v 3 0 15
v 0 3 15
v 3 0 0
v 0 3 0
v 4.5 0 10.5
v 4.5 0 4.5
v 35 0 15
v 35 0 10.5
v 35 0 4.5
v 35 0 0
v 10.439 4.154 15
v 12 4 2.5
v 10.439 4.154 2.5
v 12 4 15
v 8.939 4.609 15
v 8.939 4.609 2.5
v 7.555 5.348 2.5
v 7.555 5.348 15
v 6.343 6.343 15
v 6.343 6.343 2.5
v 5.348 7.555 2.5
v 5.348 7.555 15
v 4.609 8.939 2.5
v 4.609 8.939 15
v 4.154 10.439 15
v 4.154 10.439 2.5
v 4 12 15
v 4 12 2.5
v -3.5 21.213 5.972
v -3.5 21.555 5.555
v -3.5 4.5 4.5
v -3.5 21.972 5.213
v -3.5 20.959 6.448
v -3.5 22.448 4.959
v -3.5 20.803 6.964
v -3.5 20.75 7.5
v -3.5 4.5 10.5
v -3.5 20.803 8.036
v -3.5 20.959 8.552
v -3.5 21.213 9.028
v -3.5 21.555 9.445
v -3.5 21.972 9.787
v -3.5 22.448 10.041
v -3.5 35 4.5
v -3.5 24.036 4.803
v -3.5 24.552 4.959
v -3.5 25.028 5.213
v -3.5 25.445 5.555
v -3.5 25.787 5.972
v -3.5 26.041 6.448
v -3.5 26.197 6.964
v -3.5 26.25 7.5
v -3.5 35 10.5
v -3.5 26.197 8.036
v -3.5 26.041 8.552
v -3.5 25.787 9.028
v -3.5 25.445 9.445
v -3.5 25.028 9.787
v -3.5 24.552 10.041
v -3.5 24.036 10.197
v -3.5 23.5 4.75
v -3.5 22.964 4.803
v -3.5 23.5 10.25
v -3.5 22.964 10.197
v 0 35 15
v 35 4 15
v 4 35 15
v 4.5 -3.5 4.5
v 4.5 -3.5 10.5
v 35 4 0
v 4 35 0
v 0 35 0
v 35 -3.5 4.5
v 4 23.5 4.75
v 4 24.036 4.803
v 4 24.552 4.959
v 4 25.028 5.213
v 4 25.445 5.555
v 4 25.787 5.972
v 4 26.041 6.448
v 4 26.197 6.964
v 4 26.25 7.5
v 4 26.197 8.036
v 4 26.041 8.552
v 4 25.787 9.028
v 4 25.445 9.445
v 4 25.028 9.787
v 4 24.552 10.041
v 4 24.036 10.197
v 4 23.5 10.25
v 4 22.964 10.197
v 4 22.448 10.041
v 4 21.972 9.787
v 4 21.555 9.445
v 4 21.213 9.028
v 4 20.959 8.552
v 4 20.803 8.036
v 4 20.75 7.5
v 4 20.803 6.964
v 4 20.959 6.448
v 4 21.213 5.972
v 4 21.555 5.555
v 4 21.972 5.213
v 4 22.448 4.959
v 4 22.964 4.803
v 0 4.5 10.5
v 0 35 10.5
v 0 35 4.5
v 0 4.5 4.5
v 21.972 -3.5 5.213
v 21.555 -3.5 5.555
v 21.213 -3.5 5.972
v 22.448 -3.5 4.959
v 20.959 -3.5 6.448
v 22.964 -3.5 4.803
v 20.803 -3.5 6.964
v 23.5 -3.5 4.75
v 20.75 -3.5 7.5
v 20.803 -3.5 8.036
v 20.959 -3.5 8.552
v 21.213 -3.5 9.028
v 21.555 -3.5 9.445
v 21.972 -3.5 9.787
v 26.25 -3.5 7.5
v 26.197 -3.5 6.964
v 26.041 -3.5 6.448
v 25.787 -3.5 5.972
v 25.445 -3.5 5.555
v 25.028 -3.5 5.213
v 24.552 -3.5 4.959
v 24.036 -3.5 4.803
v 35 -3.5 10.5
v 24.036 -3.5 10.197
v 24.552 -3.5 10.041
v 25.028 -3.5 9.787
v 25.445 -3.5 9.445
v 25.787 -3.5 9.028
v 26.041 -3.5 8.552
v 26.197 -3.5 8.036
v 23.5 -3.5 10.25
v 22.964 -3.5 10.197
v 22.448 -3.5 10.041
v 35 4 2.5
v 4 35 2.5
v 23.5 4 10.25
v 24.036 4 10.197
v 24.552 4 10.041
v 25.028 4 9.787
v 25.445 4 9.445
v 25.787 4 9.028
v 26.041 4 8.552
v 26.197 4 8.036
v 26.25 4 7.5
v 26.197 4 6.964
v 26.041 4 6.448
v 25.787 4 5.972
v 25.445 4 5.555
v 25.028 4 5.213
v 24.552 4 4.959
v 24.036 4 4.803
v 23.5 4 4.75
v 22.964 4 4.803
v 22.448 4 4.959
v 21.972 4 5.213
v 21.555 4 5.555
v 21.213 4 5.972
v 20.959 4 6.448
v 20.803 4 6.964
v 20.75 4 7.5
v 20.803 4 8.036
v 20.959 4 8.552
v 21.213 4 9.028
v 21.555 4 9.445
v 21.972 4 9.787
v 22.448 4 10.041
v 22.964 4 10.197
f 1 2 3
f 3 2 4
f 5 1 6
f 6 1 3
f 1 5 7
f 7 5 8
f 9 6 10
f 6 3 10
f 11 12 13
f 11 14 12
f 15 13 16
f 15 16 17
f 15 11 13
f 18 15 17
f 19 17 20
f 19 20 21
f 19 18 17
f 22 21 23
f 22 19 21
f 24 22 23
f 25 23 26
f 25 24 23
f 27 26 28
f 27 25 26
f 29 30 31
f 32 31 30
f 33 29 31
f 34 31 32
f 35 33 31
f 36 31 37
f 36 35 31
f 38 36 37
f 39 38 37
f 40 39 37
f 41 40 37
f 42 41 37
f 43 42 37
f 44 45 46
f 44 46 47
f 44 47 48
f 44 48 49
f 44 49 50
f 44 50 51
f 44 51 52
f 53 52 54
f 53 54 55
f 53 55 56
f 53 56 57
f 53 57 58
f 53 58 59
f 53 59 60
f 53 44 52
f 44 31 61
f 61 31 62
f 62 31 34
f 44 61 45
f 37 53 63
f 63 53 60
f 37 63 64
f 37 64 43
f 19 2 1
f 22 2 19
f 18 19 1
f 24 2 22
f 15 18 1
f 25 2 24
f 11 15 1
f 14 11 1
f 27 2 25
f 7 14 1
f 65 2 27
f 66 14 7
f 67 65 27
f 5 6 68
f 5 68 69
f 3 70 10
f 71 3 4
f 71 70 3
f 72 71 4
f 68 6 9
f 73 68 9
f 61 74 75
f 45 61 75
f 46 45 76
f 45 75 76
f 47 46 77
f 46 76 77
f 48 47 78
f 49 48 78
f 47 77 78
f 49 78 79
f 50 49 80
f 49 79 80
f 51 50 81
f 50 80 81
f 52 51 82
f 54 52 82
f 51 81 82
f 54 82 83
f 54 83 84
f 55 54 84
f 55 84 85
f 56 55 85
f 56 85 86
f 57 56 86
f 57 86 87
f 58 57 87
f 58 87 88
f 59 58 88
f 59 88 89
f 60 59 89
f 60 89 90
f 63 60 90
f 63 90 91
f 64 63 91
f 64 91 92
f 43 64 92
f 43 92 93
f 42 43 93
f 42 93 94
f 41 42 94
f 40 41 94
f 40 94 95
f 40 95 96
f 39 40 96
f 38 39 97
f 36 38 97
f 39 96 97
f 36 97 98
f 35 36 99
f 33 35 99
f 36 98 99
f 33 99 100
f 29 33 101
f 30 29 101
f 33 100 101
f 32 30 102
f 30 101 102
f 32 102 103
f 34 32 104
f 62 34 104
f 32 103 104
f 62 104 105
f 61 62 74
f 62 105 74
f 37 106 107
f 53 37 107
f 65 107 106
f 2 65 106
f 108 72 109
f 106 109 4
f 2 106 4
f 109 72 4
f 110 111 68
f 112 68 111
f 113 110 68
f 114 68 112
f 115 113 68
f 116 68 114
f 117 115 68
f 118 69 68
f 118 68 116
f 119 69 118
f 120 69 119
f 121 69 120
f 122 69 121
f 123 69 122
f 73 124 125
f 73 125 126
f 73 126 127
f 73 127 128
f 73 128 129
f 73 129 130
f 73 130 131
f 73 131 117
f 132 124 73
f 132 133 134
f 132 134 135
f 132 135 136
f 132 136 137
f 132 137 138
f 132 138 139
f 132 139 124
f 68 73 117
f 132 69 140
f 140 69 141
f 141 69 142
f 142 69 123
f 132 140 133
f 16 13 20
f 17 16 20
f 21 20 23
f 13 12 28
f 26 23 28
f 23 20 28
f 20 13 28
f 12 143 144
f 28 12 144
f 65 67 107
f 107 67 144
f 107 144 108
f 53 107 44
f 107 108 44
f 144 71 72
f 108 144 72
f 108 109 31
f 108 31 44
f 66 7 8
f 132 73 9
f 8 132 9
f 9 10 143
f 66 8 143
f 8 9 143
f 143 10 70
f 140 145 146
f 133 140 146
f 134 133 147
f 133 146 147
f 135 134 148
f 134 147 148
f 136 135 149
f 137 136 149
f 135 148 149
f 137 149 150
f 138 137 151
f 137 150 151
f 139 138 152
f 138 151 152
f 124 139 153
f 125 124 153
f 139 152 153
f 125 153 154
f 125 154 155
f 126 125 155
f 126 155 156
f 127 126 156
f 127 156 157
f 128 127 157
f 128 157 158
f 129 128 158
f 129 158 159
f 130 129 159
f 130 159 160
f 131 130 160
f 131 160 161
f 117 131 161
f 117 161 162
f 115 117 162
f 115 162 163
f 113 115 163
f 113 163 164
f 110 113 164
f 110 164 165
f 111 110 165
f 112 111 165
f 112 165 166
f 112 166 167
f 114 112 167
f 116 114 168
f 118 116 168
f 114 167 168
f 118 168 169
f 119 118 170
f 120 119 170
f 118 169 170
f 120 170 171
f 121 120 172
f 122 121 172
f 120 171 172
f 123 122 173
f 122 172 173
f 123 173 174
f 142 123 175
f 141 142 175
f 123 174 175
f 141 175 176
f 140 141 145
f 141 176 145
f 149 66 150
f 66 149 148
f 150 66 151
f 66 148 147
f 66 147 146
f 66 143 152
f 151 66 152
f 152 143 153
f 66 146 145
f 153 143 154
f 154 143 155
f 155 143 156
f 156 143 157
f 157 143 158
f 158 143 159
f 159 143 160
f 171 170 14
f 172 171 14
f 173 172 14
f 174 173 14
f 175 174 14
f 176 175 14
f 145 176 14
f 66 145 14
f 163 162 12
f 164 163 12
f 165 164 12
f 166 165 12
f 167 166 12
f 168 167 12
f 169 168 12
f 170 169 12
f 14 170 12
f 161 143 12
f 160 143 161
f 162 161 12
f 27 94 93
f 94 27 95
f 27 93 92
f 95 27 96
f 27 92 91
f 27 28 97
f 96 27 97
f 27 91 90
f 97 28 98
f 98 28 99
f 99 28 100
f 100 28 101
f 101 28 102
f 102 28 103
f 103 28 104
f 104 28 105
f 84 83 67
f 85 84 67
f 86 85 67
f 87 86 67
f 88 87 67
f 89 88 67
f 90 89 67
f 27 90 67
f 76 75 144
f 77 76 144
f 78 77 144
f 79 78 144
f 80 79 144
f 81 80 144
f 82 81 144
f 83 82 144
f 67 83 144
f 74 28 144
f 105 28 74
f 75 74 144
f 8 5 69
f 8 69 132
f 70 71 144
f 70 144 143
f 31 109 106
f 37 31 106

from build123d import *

# Parameters (mm, degrees)
BOSS_EXTRUDE1_DEPTH = 2.5
BOSS_EXTRUDE2_DEPTH = 12.5
SKETCH5_W           = 30.5
SKETCH5_H           = 6
BOSS_EXTRUDE3_DEPTH = 3.5
SKETCH6_W           = 6
SKETCH6_H           = 30.5
BOSS_EXTRUDE4_DEPTH = 3.5
CUT_EXTRUDE1_REACH  = 51.102
SKETCH3_R           = 2.75
CUT_EXTRUDE2_REACH  = 51.102
SKETCH4_R           = 2.75
FILLET1_R           = 8
CHAMFER1_SIZE       = 3


with BuildPart() as part:
    # Sketch1 → Boss-Extrude1 (new body)
    with BuildSketch(Plane.XY):
        Polygon((0, 0), (0, 35), (4, 35), (35, 4), (35, 0), align=None)
    extrude(amount=BOSS_EXTRUDE1_DEPTH)

    # Sketch2 → Boss-Extrude2 (add)
    with BuildSketch(Plane.XY.offset(2.5)):
        Polygon((35, 0), (35, 4), (4, 4), (4, 35), (0, 35), (0, 0), align=None)
    extrude(amount=BOSS_EXTRUDE2_DEPTH)

    # Sketch5 → Boss-Extrude3 (add)
    with BuildSketch(Plane.XZ):
        with Locations((19.75, 7.5)):
            Rectangle(SKETCH5_W, SKETCH5_H)
    extrude(amount=BOSS_EXTRUDE3_DEPTH)

    # Sketch6 → Boss-Extrude4 (add)
    with BuildSketch(Plane.ZY):
        with Locations((7.5, 19.75)):
            Rectangle(SKETCH6_W, SKETCH6_H)
    extrude(amount=BOSS_EXTRUDE4_DEPTH)

    # Sketch3 → Cut-Extrude1 (cut, up to next)
    with BuildSketch(Plane(origin=(4, 0, 0), x_dir=(0, 0, -1), z_dir=(1, 0, 0)), mode=Mode.PRIVATE) as cut_extrude1_sk1:
        with Locations((-7.5, 23.5)):
            Circle(SKETCH3_R)
    cut_extrude1_tool1 = extrude(cut_extrude1_sk1.sketch, amount=-CUT_EXTRUDE1_REACH, mode=Mode.PRIVATE) & part.part
    add(cut_extrude1_tool1.solids().sort_by_distance((4, 23.5, 7.5))[0], mode=Mode.SUBTRACT)

    # Sketch4 → Cut-Extrude2 (cut, up to next)
    with BuildSketch(Plane(origin=(0, 4, 0), x_dir=(1, 0, 0), z_dir=(0, 1, 0)), mode=Mode.PRIVATE) as cut_extrude2_sk1:
        with Locations(Location((23.5, -7.5, 0), (0, 0, 270))):
            Circle(SKETCH4_R)
    cut_extrude2_tool1 = extrude(cut_extrude2_sk1.sketch, amount=-CUT_EXTRUDE2_REACH, mode=Mode.PRIVATE) & part.part
    add(cut_extrude2_tool1.solids().sort_by_distance((23.5, 4, 7.5))[0], mode=Mode.SUBTRACT)

    # Fillet1
    fillet1_edges = [part.edges().sort_by_distance(p)[0] for p in [
        (4, 4, 8.75),
    ]]
    fillet(fillet1_edges, radius=FILLET1_R)

    # Chamfer1
    chamfer1_edges = [part.edges().sort_by_distance(p)[0] for p in [
        (0, 0, 7.5),
    ]]
    chamfer(chamfer1_edges, length=CHAMFER1_SIZE)


solid = part.part
